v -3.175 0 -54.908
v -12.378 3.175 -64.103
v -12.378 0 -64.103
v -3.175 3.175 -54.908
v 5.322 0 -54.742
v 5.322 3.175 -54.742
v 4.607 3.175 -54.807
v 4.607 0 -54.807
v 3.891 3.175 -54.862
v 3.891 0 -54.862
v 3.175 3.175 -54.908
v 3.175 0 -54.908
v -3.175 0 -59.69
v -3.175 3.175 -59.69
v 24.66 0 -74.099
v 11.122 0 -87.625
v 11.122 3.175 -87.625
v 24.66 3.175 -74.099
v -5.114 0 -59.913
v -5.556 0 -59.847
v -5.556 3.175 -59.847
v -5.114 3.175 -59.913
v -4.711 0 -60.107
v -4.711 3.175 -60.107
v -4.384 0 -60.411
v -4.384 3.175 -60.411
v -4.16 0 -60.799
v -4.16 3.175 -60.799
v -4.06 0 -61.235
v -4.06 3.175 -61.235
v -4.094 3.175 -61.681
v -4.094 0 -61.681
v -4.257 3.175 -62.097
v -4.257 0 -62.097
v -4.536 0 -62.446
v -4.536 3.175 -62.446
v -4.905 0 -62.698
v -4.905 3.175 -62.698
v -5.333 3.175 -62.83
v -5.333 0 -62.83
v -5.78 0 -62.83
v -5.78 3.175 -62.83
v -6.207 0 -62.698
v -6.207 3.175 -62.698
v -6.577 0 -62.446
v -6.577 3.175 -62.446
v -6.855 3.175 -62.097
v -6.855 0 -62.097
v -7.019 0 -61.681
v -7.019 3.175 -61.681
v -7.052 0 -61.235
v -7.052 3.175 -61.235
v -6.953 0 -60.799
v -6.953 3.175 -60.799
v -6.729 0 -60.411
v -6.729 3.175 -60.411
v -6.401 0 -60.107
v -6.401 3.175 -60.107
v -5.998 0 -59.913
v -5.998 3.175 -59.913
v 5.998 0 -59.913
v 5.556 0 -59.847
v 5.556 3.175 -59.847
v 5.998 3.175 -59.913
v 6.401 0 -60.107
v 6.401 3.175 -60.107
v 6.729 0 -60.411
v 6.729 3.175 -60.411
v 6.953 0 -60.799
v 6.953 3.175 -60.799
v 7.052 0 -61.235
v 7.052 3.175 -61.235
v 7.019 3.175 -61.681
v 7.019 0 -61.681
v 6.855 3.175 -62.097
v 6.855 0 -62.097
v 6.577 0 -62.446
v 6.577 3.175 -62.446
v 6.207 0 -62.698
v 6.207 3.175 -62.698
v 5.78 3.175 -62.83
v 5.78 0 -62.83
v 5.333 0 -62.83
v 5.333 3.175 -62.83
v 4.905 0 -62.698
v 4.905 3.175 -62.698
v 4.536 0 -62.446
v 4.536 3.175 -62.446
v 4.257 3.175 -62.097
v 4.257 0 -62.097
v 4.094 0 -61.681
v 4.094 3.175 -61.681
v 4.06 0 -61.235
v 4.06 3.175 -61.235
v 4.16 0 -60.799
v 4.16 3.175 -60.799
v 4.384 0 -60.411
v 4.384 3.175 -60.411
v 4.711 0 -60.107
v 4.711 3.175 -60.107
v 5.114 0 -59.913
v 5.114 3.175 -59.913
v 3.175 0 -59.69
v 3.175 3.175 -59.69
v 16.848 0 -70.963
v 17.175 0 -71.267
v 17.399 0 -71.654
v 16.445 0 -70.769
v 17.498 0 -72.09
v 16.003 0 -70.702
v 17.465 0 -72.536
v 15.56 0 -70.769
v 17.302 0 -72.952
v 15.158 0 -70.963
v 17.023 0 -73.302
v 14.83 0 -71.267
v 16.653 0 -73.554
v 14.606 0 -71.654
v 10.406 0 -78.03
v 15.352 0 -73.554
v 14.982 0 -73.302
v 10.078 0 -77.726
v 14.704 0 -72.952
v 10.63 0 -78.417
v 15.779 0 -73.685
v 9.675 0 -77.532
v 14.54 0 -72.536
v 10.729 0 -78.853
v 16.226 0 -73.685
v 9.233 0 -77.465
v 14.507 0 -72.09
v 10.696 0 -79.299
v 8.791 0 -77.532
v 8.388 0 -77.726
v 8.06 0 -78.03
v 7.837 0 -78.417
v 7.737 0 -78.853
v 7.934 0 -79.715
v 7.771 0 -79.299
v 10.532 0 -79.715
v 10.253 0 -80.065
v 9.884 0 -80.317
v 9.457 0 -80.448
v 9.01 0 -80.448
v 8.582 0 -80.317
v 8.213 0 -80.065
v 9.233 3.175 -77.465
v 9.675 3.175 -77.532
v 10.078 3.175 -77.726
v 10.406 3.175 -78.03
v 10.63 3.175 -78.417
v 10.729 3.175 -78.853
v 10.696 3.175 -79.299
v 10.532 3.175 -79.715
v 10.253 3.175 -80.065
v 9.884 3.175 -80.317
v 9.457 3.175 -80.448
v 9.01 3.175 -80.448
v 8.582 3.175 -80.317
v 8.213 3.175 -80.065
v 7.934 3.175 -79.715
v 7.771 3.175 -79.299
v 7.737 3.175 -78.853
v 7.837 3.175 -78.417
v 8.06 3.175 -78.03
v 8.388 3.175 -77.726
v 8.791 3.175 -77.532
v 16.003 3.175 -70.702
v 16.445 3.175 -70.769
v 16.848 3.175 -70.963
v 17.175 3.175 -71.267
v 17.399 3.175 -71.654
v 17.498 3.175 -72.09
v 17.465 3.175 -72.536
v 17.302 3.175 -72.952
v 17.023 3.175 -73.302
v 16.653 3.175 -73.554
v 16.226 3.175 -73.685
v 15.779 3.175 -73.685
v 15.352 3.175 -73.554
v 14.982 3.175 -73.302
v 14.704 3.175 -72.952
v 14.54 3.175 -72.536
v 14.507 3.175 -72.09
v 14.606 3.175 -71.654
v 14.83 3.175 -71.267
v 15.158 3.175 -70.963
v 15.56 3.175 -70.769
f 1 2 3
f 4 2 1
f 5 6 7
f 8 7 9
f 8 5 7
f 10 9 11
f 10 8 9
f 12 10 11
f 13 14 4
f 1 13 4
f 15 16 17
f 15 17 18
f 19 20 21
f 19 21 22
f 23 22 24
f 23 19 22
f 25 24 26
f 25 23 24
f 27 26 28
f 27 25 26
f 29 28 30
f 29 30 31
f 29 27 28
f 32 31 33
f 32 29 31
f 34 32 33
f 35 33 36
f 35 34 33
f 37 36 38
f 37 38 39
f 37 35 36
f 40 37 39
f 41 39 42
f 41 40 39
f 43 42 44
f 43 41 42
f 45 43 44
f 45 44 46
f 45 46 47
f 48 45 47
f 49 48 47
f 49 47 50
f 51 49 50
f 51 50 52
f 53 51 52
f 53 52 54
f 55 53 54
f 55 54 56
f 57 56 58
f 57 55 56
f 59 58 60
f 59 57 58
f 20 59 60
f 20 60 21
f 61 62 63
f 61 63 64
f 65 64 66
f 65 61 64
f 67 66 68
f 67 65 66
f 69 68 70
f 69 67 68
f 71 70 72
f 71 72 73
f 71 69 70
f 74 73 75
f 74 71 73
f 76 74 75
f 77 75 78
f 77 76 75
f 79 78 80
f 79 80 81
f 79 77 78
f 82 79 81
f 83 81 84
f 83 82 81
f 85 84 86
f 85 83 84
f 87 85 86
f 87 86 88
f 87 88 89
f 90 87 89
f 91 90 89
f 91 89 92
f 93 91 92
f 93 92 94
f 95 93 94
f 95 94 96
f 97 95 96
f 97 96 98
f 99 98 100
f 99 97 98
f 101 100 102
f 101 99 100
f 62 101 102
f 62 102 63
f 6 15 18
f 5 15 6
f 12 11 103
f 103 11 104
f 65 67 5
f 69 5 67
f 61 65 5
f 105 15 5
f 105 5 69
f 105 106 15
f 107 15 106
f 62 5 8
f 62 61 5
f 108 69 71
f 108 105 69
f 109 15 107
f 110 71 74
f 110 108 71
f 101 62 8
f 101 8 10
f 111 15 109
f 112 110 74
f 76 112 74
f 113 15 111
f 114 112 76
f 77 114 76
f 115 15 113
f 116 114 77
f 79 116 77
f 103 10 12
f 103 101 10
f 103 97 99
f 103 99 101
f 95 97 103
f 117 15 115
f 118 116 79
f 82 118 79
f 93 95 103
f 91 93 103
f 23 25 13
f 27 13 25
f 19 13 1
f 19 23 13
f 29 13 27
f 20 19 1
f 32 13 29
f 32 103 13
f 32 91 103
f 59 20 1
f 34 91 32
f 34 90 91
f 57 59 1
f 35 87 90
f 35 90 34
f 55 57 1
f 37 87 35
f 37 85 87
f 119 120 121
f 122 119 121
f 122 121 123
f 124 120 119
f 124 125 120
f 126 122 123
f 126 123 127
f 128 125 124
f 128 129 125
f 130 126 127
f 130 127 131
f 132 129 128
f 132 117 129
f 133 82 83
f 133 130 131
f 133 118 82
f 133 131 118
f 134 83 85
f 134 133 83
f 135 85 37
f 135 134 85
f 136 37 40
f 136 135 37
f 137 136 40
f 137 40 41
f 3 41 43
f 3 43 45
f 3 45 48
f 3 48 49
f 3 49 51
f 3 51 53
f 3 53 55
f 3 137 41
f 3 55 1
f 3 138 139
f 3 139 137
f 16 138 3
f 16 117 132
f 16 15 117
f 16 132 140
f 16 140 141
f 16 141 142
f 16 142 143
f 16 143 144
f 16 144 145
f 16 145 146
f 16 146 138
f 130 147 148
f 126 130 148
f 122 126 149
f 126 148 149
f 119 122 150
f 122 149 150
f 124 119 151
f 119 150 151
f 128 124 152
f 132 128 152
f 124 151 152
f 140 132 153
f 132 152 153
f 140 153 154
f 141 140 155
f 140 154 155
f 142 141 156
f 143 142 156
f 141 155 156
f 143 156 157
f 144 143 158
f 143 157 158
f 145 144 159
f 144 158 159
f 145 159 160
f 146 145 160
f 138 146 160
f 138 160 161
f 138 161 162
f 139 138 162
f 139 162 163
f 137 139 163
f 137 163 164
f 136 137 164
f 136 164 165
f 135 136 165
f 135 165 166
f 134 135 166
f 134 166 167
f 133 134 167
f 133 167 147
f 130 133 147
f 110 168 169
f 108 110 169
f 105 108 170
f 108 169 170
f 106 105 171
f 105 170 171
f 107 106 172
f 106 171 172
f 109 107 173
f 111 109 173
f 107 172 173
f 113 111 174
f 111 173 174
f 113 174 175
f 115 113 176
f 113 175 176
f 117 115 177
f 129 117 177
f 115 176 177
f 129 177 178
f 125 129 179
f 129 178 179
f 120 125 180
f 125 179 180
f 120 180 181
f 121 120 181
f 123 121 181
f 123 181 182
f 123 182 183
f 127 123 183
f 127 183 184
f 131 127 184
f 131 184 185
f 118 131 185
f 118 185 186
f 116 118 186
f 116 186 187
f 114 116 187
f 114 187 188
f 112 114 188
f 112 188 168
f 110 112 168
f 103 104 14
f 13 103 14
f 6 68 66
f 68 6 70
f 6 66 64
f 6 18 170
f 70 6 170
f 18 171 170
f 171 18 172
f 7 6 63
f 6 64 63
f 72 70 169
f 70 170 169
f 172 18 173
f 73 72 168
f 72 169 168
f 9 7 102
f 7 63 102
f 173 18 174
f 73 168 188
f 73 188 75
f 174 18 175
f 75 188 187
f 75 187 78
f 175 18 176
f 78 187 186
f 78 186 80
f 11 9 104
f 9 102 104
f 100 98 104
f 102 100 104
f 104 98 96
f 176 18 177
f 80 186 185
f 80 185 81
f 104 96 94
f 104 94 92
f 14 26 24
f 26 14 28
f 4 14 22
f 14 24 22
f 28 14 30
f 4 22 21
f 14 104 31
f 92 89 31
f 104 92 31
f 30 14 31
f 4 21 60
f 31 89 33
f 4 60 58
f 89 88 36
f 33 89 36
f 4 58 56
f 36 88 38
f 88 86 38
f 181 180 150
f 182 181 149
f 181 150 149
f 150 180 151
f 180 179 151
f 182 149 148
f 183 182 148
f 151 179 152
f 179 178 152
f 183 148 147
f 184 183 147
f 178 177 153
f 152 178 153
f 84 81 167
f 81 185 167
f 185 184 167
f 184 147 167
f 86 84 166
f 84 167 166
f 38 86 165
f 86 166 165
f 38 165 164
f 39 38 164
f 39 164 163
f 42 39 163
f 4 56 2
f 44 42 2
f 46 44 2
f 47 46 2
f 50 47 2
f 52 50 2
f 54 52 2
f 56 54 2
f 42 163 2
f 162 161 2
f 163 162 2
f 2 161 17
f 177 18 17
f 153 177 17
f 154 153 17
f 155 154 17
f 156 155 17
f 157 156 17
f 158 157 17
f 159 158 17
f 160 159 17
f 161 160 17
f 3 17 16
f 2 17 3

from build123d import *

# Parameters (mm, degrees)
SKETCH1_R           = 1.5
SKETCH1_R_2         = 55
BOSS_EXTRUDE1_DEPTH = 3.175
CUT_EXTRUDE3_DEPTH  = 140.736059076
CUT_EXTRUDE4_START  = -10
SKETCH3_R           = 1.5
CUT_EXTRUDE4_DEPTH  = 10
CUT_EXTRUDE5_DEPTH  = 140.736059076
CUT_EXTRUDE6_DEPTH  = 140.736059076
SKETCH6_R           = 1.5
CUT_EXTRUDE7_DEPTH  = 124.953233311
SKETCH7_W           = 69.762043991
SKETCH7_H           = 61.208981149
CUT_EXTRUDE8_DEPTH  = 100


with BuildPart() as part:
    # Sketch1 → Boss-Extrude1 (new body)
    with BuildSketch(Plane(origin=(0, 0, 0), x_dir=(1, 0, 0), z_dir=(0, 1, 0))):
        Polygon((0.047005036, -98.782806148), (-98.782806148, -0.047005036), (-0.047005036, 98.782806148), (98.782806148, 0.047005036), align=None)
        with Locations(Location((-61.346730494, 5.55625, 0), (0, 0, 270))):
            Circle(SKETCH1_R, mode=Mode.SUBTRACT)
        with Locations(Location((-61.346730494, -5.55625, 0), (0, 0, 270))):
            Circle(SKETCH1_R, mode=Mode.SUBTRACT)
        with Locations(Location((-5.55625, -61.346730494, 0), (0, 0, 270))):
            Circle(SKETCH1_R, mode=Mode.SUBTRACT)
        with Locations(Location((5.55625, -61.346730494, 0), (0, 0, 270))):
            Circle(SKETCH1_R, mode=Mode.SUBTRACT)
        with Locations(Location((61.346730494, -5.55625, 0), (0, 0, 270))):
            Circle(SKETCH1_R, mode=Mode.SUBTRACT)
        with Locations(Location((61.346730494, 5.55625, 0), (0, 0, 270))):
            Circle(SKETCH1_R, mode=Mode.SUBTRACT)
        with Locations(Location((5.55625, 61.346730494, 0), (0, 0, 270))):
            Circle(SKETCH1_R, mode=Mode.SUBTRACT)
        with Locations(Location((-5.55625, 61.346730494, 0), (0, 0, 270))):
            Circle(SKETCH1_R, mode=Mode.SUBTRACT)
        with Locations(Location((0, 0, 0), (0, 0, 270))):
            Circle(SKETCH1_R_2, mode=Mode.SUBTRACT)
    extrude(amount=BOSS_EXTRUDE1_DEPTH)

    # Sketch2 → Cut-Extrude3 (cut, through all)
    with BuildSketch(Plane(origin=(0, 3.175, 0), x_dir=(1, 0, 0), z_dir=(0, 1, 0))):
        Polygon((3.175, 53.34), (3.175, 59.69), (-3.175, 59.69), (-3.175, 53.34), (-3.175, 52.244537665), (3.175, 52.244537665), align=None)
        Polygon((53.34, -3.175), (59.69, -3.175), (59.69, 3.175), (53.34, 3.175), (52.244537665, 3.175), (52.244537665, -3.175), align=None)
        Polygon((-3.175, -53.34), (-3.175, -59.69), (3.175, -59.69), (3.175, -53.34), (3.175, -52.244537665), (-3.175, -52.244537665), align=None)
        Polygon((-53.34, 3.175), (-59.69, 3.175), (-59.69, -3.175), (-53.34, -3.175), (-52.244537665, -3.175), (-52.244537665, 3.175), align=None)
    extrude(amount=-CUT_EXTRUDE3_DEPTH, mode=Mode.SUBTRACT)

    # Sketch3 → Cut-Extrude4 (cut)
    # profile 1 of 3: a face of its own
    with BuildSketch(Plane(origin=(0, 3.175, 0), x_dir=(1, 0, 0), z_dir=(0, 1, 0)).offset(CUT_EXTRUDE4_START)):
        with BuildLine():
            Line((38.872362643, 38.909374482), (49.367900556, 49.414905592))
            Line((49.367900556, 49.414905592), (24.66044776, 74.09885587))
            Line((24.66044776, 74.09885587), (5.321919094, 54.741914263))
            ThreePointArc((5.321919094, 54.741914263), (23.472344653, 49.739813394), (38.872362643, 38.909374482))
        make_face()
    # profile 2 of 3: a face of its own
    with BuildSketch(Plane(origin=(0, 3.175, 0), x_dir=(1, 0, 0), z_dir=(0, 1, 0)).offset(CUT_EXTRUDE4_START)):
        with BuildLine():
            Line((-49.367900556, -49.414905592), (-38.872362643, -38.909374482))
            ThreePointArc((-38.872362643, -38.909374482), (-49.717452606, -23.519670626), (-54.736824686, -5.374013707))
            Line((-54.736824686, -5.374013707), (-74.075353352, -24.730955314))
            Line((-74.075353352, -24.730955314), (-49.367900556, -49.414905592))
        make_face()
    # profile 3 of 3: a face of its own
    with BuildSketch(Plane(origin=(0, 3.175, 0), x_dir=(1, 0, 0), z_dir=(0, 1, 0)).offset(CUT_EXTRUDE4_START)):
        with BuildLine():
            Line((98.782806148, 0.047005036), (49.367900556, 49.414905592))
            Line((49.367900556, 49.414905592), (38.872362643, 38.909374482))
            ThreePointArc((38.872362643, 38.909374482), (50.179066182, 22.518022052), (54.908281479, 3.175))
            Line((54.908281479, 3.175), (59.69, 3.175))
            Line((59.69, 3.175), (59.69, -3.175))
            Line((59.69, -3.175), (54.908281479, -3.175))
            ThreePointArc((54.908281479, -3.175), (38.890872965, -38.890872965), (3.175, -54.908281479))
            Line((3.175, -54.908281479), (3.175, -59.69))
            Line((3.175, -59.69), (-3.175, -59.69))
            Line((-3.175, -59.69), (-3.175, -54.908281479))
            ThreePointArc((-3.175, -54.908281479), (-22.494142184, -50.189775527), (-38.872362643, -38.909374482))
            Line((-38.872362643, -38.909374482), (-49.367900556, -49.414905592))
            Line((-49.367900556, -49.414905592), (0.047005036, -98.782806148))
            Line((0.047005036, -98.782806148), (98.782806148, 0.047005036))
        make_face()
        with Locations((-5.55625, -61.346730494)):
            Circle(SKETCH3_R, mode=Mode.SUBTRACT)
        with Locations((5.55625, -61.346730494)):
            Circle(SKETCH3_R, mode=Mode.SUBTRACT)
        with Locations((61.346730494, -5.55625)):
            Circle(SKETCH3_R, mode=Mode.SUBTRACT)
        with Locations((61.346730494, 5.55625)):
            Circle(SKETCH3_R, mode=Mode.SUBTRACT)
    extrude(amount=CUT_EXTRUDE4_DEPTH, mode=Mode.SUBTRACT)

    # Sketch4 → Cut-Extrude5 (cut, through all)
    with BuildSketch(Plane(origin=(0, 3.175, 0), x_dir=(1, 0, 0), z_dir=(0, 1, 0))):
        Polygon((-54.908281479, 3.175), (-75.255419375, 23.502783048), (-23.546766486, 75.260669691), (-3.175, 54.908281479), align=None)
    extrude(amount=-CUT_EXTRUDE5_DEPTH, mode=Mode.SUBTRACT)


with BuildPart() as cut_extrude5_piece_1:
    # of the separate pieces the step leaves, piece 1, a body of its own (cut_extrude5_pieces)
    add(part.part.solids().sort_by_distance((-74.075353352, 0, 24.730955314))[0])


with BuildPart() as cut_extrude5_piece_2:
    # of the separate pieces the step leaves, piece 2, a body of its own (cut_extrude5_pieces)
    add(part.part.solids().sort_by_distance((-3.175, 0, -54.908281479))[0])


with BuildPart() as cut_extrude6_tool:
    # Sketch5 → Cut-Extrude6 (new, through all)
    with BuildSketch(Plane(origin=(0, 3.175, 0), x_dir=(1, 0, 0), z_dir=(0, 1, 0))):
        Polygon((-0.047005036, 98.782806148), (11.121699276, 87.624725864), (-87.614101836, -11.205085321), (-98.782806148, -0.047005036), align=None)
    extrude(amount=-CUT_EXTRUDE6_DEPTH)


with BuildPart() as cut_extrude5_piece_1_1:
    add(cut_extrude5_piece_1.part)

    # Cut-Extrude6: cut by cut_extrude6_tool
    add(cut_extrude6_tool.part, mode=Mode.SUBTRACT)


with BuildPart() as cut_extrude5_piece_2_1:
    add(cut_extrude5_piece_2.part)

    # Cut-Extrude6: cut by cut_extrude6_tool
    add(cut_extrude6_tool.part, mode=Mode.SUBTRACT)


with BuildPart() as cut_extrude7_tool:
    # Sketch6 → Cut-Extrude7 (new, through all)
    with BuildSketch(Plane(origin=(0, 3.175, 0), x_dir=(1, 0, 0), z_dir=(0, 1, 0))):
        with BuildLine():
            ThreePointArc((-73.220428508, -14.983508678), (-73.219419094, -17.104828781), (-71.09809899, -17.103819368))
            Line((-71.09809899, -17.103819368), (-73.220428508, -14.983508678))
        make_face()
        with BuildLine():
            Line((-73.220428508, -14.983508678), (-71.09809899, -17.103819368))
            ThreePointArc((-71.09809899, -17.103819368), (-70.773307917, -16.617359439), (-70.659263749, -16.043664023))
            ThreePointArc((-70.659263749, -16.043664023), (-71.585568332, -14.657708191), (-73.220428508, -14.983508678))
        make_face()
        with BuildLine():
            ThreePointArc((-79.989802749, -8.220573681), (-79.988793336, -10.341893785), (-77.867473232, -10.340884371))
            Line((-77.867473232, -10.340884371), (-79.989802749, -8.220573681))
        make_face()
        with BuildLine():
            Line((-79.989802749, -8.220573681), (-77.867473232, -10.340884371))
            ThreePointArc((-77.867473232, -10.340884371), (-77.542682159, -9.854424443), (-77.428637991, -9.280729026))
            ThreePointArc((-77.428637991, -9.280729026), (-78.354942574, -7.894773194), (-79.989802749, -8.220573681))
        make_face()
        with Locations(Location((16.002609239, 72.202151202, 0), (0, 0, 270))):
            Circle(SKETCH6_R)
        with Locations(Location((9.233234997, 78.965086199, 0), (0, 0, 270))):
            Circle(SKETCH6_R)
    extrude(amount=-CUT_EXTRUDE7_DEPTH)


with BuildPart() as cut_extrude5_piece_1_2:
    add(cut_extrude5_piece_1_1.part)

    # Cut-Extrude7: cut by cut_extrude7_tool
    add(cut_extrude7_tool.part, mode=Mode.SUBTRACT)

    # Sketch7 → Cut-Extrude8 (cut)
    with BuildSketch(Plane(origin=(-49.367900556, 0, 49.414905592), x_dir=(0.7074431724013648, 0, 0.7067702298644821), z_dir=(-0.7067702298644821, 0, 0.7074431724013648))):
        with Locations((-46.400178309, 4.239305035)):
            Rectangle(SKETCH7_W, SKETCH7_H)
    extrude(amount=-CUT_EXTRUDE8_DEPTH, mode=Mode.SUBTRACT)


with BuildPart() as cut_extrude5_piece_2_2:
    add(cut_extrude5_piece_2_1.part)

    # Cut-Extrude7: cut by cut_extrude7_tool
    add(cut_extrude7_tool.part, mode=Mode.SUBTRACT)


solid = cut_extrude5_piece_2_2.part
